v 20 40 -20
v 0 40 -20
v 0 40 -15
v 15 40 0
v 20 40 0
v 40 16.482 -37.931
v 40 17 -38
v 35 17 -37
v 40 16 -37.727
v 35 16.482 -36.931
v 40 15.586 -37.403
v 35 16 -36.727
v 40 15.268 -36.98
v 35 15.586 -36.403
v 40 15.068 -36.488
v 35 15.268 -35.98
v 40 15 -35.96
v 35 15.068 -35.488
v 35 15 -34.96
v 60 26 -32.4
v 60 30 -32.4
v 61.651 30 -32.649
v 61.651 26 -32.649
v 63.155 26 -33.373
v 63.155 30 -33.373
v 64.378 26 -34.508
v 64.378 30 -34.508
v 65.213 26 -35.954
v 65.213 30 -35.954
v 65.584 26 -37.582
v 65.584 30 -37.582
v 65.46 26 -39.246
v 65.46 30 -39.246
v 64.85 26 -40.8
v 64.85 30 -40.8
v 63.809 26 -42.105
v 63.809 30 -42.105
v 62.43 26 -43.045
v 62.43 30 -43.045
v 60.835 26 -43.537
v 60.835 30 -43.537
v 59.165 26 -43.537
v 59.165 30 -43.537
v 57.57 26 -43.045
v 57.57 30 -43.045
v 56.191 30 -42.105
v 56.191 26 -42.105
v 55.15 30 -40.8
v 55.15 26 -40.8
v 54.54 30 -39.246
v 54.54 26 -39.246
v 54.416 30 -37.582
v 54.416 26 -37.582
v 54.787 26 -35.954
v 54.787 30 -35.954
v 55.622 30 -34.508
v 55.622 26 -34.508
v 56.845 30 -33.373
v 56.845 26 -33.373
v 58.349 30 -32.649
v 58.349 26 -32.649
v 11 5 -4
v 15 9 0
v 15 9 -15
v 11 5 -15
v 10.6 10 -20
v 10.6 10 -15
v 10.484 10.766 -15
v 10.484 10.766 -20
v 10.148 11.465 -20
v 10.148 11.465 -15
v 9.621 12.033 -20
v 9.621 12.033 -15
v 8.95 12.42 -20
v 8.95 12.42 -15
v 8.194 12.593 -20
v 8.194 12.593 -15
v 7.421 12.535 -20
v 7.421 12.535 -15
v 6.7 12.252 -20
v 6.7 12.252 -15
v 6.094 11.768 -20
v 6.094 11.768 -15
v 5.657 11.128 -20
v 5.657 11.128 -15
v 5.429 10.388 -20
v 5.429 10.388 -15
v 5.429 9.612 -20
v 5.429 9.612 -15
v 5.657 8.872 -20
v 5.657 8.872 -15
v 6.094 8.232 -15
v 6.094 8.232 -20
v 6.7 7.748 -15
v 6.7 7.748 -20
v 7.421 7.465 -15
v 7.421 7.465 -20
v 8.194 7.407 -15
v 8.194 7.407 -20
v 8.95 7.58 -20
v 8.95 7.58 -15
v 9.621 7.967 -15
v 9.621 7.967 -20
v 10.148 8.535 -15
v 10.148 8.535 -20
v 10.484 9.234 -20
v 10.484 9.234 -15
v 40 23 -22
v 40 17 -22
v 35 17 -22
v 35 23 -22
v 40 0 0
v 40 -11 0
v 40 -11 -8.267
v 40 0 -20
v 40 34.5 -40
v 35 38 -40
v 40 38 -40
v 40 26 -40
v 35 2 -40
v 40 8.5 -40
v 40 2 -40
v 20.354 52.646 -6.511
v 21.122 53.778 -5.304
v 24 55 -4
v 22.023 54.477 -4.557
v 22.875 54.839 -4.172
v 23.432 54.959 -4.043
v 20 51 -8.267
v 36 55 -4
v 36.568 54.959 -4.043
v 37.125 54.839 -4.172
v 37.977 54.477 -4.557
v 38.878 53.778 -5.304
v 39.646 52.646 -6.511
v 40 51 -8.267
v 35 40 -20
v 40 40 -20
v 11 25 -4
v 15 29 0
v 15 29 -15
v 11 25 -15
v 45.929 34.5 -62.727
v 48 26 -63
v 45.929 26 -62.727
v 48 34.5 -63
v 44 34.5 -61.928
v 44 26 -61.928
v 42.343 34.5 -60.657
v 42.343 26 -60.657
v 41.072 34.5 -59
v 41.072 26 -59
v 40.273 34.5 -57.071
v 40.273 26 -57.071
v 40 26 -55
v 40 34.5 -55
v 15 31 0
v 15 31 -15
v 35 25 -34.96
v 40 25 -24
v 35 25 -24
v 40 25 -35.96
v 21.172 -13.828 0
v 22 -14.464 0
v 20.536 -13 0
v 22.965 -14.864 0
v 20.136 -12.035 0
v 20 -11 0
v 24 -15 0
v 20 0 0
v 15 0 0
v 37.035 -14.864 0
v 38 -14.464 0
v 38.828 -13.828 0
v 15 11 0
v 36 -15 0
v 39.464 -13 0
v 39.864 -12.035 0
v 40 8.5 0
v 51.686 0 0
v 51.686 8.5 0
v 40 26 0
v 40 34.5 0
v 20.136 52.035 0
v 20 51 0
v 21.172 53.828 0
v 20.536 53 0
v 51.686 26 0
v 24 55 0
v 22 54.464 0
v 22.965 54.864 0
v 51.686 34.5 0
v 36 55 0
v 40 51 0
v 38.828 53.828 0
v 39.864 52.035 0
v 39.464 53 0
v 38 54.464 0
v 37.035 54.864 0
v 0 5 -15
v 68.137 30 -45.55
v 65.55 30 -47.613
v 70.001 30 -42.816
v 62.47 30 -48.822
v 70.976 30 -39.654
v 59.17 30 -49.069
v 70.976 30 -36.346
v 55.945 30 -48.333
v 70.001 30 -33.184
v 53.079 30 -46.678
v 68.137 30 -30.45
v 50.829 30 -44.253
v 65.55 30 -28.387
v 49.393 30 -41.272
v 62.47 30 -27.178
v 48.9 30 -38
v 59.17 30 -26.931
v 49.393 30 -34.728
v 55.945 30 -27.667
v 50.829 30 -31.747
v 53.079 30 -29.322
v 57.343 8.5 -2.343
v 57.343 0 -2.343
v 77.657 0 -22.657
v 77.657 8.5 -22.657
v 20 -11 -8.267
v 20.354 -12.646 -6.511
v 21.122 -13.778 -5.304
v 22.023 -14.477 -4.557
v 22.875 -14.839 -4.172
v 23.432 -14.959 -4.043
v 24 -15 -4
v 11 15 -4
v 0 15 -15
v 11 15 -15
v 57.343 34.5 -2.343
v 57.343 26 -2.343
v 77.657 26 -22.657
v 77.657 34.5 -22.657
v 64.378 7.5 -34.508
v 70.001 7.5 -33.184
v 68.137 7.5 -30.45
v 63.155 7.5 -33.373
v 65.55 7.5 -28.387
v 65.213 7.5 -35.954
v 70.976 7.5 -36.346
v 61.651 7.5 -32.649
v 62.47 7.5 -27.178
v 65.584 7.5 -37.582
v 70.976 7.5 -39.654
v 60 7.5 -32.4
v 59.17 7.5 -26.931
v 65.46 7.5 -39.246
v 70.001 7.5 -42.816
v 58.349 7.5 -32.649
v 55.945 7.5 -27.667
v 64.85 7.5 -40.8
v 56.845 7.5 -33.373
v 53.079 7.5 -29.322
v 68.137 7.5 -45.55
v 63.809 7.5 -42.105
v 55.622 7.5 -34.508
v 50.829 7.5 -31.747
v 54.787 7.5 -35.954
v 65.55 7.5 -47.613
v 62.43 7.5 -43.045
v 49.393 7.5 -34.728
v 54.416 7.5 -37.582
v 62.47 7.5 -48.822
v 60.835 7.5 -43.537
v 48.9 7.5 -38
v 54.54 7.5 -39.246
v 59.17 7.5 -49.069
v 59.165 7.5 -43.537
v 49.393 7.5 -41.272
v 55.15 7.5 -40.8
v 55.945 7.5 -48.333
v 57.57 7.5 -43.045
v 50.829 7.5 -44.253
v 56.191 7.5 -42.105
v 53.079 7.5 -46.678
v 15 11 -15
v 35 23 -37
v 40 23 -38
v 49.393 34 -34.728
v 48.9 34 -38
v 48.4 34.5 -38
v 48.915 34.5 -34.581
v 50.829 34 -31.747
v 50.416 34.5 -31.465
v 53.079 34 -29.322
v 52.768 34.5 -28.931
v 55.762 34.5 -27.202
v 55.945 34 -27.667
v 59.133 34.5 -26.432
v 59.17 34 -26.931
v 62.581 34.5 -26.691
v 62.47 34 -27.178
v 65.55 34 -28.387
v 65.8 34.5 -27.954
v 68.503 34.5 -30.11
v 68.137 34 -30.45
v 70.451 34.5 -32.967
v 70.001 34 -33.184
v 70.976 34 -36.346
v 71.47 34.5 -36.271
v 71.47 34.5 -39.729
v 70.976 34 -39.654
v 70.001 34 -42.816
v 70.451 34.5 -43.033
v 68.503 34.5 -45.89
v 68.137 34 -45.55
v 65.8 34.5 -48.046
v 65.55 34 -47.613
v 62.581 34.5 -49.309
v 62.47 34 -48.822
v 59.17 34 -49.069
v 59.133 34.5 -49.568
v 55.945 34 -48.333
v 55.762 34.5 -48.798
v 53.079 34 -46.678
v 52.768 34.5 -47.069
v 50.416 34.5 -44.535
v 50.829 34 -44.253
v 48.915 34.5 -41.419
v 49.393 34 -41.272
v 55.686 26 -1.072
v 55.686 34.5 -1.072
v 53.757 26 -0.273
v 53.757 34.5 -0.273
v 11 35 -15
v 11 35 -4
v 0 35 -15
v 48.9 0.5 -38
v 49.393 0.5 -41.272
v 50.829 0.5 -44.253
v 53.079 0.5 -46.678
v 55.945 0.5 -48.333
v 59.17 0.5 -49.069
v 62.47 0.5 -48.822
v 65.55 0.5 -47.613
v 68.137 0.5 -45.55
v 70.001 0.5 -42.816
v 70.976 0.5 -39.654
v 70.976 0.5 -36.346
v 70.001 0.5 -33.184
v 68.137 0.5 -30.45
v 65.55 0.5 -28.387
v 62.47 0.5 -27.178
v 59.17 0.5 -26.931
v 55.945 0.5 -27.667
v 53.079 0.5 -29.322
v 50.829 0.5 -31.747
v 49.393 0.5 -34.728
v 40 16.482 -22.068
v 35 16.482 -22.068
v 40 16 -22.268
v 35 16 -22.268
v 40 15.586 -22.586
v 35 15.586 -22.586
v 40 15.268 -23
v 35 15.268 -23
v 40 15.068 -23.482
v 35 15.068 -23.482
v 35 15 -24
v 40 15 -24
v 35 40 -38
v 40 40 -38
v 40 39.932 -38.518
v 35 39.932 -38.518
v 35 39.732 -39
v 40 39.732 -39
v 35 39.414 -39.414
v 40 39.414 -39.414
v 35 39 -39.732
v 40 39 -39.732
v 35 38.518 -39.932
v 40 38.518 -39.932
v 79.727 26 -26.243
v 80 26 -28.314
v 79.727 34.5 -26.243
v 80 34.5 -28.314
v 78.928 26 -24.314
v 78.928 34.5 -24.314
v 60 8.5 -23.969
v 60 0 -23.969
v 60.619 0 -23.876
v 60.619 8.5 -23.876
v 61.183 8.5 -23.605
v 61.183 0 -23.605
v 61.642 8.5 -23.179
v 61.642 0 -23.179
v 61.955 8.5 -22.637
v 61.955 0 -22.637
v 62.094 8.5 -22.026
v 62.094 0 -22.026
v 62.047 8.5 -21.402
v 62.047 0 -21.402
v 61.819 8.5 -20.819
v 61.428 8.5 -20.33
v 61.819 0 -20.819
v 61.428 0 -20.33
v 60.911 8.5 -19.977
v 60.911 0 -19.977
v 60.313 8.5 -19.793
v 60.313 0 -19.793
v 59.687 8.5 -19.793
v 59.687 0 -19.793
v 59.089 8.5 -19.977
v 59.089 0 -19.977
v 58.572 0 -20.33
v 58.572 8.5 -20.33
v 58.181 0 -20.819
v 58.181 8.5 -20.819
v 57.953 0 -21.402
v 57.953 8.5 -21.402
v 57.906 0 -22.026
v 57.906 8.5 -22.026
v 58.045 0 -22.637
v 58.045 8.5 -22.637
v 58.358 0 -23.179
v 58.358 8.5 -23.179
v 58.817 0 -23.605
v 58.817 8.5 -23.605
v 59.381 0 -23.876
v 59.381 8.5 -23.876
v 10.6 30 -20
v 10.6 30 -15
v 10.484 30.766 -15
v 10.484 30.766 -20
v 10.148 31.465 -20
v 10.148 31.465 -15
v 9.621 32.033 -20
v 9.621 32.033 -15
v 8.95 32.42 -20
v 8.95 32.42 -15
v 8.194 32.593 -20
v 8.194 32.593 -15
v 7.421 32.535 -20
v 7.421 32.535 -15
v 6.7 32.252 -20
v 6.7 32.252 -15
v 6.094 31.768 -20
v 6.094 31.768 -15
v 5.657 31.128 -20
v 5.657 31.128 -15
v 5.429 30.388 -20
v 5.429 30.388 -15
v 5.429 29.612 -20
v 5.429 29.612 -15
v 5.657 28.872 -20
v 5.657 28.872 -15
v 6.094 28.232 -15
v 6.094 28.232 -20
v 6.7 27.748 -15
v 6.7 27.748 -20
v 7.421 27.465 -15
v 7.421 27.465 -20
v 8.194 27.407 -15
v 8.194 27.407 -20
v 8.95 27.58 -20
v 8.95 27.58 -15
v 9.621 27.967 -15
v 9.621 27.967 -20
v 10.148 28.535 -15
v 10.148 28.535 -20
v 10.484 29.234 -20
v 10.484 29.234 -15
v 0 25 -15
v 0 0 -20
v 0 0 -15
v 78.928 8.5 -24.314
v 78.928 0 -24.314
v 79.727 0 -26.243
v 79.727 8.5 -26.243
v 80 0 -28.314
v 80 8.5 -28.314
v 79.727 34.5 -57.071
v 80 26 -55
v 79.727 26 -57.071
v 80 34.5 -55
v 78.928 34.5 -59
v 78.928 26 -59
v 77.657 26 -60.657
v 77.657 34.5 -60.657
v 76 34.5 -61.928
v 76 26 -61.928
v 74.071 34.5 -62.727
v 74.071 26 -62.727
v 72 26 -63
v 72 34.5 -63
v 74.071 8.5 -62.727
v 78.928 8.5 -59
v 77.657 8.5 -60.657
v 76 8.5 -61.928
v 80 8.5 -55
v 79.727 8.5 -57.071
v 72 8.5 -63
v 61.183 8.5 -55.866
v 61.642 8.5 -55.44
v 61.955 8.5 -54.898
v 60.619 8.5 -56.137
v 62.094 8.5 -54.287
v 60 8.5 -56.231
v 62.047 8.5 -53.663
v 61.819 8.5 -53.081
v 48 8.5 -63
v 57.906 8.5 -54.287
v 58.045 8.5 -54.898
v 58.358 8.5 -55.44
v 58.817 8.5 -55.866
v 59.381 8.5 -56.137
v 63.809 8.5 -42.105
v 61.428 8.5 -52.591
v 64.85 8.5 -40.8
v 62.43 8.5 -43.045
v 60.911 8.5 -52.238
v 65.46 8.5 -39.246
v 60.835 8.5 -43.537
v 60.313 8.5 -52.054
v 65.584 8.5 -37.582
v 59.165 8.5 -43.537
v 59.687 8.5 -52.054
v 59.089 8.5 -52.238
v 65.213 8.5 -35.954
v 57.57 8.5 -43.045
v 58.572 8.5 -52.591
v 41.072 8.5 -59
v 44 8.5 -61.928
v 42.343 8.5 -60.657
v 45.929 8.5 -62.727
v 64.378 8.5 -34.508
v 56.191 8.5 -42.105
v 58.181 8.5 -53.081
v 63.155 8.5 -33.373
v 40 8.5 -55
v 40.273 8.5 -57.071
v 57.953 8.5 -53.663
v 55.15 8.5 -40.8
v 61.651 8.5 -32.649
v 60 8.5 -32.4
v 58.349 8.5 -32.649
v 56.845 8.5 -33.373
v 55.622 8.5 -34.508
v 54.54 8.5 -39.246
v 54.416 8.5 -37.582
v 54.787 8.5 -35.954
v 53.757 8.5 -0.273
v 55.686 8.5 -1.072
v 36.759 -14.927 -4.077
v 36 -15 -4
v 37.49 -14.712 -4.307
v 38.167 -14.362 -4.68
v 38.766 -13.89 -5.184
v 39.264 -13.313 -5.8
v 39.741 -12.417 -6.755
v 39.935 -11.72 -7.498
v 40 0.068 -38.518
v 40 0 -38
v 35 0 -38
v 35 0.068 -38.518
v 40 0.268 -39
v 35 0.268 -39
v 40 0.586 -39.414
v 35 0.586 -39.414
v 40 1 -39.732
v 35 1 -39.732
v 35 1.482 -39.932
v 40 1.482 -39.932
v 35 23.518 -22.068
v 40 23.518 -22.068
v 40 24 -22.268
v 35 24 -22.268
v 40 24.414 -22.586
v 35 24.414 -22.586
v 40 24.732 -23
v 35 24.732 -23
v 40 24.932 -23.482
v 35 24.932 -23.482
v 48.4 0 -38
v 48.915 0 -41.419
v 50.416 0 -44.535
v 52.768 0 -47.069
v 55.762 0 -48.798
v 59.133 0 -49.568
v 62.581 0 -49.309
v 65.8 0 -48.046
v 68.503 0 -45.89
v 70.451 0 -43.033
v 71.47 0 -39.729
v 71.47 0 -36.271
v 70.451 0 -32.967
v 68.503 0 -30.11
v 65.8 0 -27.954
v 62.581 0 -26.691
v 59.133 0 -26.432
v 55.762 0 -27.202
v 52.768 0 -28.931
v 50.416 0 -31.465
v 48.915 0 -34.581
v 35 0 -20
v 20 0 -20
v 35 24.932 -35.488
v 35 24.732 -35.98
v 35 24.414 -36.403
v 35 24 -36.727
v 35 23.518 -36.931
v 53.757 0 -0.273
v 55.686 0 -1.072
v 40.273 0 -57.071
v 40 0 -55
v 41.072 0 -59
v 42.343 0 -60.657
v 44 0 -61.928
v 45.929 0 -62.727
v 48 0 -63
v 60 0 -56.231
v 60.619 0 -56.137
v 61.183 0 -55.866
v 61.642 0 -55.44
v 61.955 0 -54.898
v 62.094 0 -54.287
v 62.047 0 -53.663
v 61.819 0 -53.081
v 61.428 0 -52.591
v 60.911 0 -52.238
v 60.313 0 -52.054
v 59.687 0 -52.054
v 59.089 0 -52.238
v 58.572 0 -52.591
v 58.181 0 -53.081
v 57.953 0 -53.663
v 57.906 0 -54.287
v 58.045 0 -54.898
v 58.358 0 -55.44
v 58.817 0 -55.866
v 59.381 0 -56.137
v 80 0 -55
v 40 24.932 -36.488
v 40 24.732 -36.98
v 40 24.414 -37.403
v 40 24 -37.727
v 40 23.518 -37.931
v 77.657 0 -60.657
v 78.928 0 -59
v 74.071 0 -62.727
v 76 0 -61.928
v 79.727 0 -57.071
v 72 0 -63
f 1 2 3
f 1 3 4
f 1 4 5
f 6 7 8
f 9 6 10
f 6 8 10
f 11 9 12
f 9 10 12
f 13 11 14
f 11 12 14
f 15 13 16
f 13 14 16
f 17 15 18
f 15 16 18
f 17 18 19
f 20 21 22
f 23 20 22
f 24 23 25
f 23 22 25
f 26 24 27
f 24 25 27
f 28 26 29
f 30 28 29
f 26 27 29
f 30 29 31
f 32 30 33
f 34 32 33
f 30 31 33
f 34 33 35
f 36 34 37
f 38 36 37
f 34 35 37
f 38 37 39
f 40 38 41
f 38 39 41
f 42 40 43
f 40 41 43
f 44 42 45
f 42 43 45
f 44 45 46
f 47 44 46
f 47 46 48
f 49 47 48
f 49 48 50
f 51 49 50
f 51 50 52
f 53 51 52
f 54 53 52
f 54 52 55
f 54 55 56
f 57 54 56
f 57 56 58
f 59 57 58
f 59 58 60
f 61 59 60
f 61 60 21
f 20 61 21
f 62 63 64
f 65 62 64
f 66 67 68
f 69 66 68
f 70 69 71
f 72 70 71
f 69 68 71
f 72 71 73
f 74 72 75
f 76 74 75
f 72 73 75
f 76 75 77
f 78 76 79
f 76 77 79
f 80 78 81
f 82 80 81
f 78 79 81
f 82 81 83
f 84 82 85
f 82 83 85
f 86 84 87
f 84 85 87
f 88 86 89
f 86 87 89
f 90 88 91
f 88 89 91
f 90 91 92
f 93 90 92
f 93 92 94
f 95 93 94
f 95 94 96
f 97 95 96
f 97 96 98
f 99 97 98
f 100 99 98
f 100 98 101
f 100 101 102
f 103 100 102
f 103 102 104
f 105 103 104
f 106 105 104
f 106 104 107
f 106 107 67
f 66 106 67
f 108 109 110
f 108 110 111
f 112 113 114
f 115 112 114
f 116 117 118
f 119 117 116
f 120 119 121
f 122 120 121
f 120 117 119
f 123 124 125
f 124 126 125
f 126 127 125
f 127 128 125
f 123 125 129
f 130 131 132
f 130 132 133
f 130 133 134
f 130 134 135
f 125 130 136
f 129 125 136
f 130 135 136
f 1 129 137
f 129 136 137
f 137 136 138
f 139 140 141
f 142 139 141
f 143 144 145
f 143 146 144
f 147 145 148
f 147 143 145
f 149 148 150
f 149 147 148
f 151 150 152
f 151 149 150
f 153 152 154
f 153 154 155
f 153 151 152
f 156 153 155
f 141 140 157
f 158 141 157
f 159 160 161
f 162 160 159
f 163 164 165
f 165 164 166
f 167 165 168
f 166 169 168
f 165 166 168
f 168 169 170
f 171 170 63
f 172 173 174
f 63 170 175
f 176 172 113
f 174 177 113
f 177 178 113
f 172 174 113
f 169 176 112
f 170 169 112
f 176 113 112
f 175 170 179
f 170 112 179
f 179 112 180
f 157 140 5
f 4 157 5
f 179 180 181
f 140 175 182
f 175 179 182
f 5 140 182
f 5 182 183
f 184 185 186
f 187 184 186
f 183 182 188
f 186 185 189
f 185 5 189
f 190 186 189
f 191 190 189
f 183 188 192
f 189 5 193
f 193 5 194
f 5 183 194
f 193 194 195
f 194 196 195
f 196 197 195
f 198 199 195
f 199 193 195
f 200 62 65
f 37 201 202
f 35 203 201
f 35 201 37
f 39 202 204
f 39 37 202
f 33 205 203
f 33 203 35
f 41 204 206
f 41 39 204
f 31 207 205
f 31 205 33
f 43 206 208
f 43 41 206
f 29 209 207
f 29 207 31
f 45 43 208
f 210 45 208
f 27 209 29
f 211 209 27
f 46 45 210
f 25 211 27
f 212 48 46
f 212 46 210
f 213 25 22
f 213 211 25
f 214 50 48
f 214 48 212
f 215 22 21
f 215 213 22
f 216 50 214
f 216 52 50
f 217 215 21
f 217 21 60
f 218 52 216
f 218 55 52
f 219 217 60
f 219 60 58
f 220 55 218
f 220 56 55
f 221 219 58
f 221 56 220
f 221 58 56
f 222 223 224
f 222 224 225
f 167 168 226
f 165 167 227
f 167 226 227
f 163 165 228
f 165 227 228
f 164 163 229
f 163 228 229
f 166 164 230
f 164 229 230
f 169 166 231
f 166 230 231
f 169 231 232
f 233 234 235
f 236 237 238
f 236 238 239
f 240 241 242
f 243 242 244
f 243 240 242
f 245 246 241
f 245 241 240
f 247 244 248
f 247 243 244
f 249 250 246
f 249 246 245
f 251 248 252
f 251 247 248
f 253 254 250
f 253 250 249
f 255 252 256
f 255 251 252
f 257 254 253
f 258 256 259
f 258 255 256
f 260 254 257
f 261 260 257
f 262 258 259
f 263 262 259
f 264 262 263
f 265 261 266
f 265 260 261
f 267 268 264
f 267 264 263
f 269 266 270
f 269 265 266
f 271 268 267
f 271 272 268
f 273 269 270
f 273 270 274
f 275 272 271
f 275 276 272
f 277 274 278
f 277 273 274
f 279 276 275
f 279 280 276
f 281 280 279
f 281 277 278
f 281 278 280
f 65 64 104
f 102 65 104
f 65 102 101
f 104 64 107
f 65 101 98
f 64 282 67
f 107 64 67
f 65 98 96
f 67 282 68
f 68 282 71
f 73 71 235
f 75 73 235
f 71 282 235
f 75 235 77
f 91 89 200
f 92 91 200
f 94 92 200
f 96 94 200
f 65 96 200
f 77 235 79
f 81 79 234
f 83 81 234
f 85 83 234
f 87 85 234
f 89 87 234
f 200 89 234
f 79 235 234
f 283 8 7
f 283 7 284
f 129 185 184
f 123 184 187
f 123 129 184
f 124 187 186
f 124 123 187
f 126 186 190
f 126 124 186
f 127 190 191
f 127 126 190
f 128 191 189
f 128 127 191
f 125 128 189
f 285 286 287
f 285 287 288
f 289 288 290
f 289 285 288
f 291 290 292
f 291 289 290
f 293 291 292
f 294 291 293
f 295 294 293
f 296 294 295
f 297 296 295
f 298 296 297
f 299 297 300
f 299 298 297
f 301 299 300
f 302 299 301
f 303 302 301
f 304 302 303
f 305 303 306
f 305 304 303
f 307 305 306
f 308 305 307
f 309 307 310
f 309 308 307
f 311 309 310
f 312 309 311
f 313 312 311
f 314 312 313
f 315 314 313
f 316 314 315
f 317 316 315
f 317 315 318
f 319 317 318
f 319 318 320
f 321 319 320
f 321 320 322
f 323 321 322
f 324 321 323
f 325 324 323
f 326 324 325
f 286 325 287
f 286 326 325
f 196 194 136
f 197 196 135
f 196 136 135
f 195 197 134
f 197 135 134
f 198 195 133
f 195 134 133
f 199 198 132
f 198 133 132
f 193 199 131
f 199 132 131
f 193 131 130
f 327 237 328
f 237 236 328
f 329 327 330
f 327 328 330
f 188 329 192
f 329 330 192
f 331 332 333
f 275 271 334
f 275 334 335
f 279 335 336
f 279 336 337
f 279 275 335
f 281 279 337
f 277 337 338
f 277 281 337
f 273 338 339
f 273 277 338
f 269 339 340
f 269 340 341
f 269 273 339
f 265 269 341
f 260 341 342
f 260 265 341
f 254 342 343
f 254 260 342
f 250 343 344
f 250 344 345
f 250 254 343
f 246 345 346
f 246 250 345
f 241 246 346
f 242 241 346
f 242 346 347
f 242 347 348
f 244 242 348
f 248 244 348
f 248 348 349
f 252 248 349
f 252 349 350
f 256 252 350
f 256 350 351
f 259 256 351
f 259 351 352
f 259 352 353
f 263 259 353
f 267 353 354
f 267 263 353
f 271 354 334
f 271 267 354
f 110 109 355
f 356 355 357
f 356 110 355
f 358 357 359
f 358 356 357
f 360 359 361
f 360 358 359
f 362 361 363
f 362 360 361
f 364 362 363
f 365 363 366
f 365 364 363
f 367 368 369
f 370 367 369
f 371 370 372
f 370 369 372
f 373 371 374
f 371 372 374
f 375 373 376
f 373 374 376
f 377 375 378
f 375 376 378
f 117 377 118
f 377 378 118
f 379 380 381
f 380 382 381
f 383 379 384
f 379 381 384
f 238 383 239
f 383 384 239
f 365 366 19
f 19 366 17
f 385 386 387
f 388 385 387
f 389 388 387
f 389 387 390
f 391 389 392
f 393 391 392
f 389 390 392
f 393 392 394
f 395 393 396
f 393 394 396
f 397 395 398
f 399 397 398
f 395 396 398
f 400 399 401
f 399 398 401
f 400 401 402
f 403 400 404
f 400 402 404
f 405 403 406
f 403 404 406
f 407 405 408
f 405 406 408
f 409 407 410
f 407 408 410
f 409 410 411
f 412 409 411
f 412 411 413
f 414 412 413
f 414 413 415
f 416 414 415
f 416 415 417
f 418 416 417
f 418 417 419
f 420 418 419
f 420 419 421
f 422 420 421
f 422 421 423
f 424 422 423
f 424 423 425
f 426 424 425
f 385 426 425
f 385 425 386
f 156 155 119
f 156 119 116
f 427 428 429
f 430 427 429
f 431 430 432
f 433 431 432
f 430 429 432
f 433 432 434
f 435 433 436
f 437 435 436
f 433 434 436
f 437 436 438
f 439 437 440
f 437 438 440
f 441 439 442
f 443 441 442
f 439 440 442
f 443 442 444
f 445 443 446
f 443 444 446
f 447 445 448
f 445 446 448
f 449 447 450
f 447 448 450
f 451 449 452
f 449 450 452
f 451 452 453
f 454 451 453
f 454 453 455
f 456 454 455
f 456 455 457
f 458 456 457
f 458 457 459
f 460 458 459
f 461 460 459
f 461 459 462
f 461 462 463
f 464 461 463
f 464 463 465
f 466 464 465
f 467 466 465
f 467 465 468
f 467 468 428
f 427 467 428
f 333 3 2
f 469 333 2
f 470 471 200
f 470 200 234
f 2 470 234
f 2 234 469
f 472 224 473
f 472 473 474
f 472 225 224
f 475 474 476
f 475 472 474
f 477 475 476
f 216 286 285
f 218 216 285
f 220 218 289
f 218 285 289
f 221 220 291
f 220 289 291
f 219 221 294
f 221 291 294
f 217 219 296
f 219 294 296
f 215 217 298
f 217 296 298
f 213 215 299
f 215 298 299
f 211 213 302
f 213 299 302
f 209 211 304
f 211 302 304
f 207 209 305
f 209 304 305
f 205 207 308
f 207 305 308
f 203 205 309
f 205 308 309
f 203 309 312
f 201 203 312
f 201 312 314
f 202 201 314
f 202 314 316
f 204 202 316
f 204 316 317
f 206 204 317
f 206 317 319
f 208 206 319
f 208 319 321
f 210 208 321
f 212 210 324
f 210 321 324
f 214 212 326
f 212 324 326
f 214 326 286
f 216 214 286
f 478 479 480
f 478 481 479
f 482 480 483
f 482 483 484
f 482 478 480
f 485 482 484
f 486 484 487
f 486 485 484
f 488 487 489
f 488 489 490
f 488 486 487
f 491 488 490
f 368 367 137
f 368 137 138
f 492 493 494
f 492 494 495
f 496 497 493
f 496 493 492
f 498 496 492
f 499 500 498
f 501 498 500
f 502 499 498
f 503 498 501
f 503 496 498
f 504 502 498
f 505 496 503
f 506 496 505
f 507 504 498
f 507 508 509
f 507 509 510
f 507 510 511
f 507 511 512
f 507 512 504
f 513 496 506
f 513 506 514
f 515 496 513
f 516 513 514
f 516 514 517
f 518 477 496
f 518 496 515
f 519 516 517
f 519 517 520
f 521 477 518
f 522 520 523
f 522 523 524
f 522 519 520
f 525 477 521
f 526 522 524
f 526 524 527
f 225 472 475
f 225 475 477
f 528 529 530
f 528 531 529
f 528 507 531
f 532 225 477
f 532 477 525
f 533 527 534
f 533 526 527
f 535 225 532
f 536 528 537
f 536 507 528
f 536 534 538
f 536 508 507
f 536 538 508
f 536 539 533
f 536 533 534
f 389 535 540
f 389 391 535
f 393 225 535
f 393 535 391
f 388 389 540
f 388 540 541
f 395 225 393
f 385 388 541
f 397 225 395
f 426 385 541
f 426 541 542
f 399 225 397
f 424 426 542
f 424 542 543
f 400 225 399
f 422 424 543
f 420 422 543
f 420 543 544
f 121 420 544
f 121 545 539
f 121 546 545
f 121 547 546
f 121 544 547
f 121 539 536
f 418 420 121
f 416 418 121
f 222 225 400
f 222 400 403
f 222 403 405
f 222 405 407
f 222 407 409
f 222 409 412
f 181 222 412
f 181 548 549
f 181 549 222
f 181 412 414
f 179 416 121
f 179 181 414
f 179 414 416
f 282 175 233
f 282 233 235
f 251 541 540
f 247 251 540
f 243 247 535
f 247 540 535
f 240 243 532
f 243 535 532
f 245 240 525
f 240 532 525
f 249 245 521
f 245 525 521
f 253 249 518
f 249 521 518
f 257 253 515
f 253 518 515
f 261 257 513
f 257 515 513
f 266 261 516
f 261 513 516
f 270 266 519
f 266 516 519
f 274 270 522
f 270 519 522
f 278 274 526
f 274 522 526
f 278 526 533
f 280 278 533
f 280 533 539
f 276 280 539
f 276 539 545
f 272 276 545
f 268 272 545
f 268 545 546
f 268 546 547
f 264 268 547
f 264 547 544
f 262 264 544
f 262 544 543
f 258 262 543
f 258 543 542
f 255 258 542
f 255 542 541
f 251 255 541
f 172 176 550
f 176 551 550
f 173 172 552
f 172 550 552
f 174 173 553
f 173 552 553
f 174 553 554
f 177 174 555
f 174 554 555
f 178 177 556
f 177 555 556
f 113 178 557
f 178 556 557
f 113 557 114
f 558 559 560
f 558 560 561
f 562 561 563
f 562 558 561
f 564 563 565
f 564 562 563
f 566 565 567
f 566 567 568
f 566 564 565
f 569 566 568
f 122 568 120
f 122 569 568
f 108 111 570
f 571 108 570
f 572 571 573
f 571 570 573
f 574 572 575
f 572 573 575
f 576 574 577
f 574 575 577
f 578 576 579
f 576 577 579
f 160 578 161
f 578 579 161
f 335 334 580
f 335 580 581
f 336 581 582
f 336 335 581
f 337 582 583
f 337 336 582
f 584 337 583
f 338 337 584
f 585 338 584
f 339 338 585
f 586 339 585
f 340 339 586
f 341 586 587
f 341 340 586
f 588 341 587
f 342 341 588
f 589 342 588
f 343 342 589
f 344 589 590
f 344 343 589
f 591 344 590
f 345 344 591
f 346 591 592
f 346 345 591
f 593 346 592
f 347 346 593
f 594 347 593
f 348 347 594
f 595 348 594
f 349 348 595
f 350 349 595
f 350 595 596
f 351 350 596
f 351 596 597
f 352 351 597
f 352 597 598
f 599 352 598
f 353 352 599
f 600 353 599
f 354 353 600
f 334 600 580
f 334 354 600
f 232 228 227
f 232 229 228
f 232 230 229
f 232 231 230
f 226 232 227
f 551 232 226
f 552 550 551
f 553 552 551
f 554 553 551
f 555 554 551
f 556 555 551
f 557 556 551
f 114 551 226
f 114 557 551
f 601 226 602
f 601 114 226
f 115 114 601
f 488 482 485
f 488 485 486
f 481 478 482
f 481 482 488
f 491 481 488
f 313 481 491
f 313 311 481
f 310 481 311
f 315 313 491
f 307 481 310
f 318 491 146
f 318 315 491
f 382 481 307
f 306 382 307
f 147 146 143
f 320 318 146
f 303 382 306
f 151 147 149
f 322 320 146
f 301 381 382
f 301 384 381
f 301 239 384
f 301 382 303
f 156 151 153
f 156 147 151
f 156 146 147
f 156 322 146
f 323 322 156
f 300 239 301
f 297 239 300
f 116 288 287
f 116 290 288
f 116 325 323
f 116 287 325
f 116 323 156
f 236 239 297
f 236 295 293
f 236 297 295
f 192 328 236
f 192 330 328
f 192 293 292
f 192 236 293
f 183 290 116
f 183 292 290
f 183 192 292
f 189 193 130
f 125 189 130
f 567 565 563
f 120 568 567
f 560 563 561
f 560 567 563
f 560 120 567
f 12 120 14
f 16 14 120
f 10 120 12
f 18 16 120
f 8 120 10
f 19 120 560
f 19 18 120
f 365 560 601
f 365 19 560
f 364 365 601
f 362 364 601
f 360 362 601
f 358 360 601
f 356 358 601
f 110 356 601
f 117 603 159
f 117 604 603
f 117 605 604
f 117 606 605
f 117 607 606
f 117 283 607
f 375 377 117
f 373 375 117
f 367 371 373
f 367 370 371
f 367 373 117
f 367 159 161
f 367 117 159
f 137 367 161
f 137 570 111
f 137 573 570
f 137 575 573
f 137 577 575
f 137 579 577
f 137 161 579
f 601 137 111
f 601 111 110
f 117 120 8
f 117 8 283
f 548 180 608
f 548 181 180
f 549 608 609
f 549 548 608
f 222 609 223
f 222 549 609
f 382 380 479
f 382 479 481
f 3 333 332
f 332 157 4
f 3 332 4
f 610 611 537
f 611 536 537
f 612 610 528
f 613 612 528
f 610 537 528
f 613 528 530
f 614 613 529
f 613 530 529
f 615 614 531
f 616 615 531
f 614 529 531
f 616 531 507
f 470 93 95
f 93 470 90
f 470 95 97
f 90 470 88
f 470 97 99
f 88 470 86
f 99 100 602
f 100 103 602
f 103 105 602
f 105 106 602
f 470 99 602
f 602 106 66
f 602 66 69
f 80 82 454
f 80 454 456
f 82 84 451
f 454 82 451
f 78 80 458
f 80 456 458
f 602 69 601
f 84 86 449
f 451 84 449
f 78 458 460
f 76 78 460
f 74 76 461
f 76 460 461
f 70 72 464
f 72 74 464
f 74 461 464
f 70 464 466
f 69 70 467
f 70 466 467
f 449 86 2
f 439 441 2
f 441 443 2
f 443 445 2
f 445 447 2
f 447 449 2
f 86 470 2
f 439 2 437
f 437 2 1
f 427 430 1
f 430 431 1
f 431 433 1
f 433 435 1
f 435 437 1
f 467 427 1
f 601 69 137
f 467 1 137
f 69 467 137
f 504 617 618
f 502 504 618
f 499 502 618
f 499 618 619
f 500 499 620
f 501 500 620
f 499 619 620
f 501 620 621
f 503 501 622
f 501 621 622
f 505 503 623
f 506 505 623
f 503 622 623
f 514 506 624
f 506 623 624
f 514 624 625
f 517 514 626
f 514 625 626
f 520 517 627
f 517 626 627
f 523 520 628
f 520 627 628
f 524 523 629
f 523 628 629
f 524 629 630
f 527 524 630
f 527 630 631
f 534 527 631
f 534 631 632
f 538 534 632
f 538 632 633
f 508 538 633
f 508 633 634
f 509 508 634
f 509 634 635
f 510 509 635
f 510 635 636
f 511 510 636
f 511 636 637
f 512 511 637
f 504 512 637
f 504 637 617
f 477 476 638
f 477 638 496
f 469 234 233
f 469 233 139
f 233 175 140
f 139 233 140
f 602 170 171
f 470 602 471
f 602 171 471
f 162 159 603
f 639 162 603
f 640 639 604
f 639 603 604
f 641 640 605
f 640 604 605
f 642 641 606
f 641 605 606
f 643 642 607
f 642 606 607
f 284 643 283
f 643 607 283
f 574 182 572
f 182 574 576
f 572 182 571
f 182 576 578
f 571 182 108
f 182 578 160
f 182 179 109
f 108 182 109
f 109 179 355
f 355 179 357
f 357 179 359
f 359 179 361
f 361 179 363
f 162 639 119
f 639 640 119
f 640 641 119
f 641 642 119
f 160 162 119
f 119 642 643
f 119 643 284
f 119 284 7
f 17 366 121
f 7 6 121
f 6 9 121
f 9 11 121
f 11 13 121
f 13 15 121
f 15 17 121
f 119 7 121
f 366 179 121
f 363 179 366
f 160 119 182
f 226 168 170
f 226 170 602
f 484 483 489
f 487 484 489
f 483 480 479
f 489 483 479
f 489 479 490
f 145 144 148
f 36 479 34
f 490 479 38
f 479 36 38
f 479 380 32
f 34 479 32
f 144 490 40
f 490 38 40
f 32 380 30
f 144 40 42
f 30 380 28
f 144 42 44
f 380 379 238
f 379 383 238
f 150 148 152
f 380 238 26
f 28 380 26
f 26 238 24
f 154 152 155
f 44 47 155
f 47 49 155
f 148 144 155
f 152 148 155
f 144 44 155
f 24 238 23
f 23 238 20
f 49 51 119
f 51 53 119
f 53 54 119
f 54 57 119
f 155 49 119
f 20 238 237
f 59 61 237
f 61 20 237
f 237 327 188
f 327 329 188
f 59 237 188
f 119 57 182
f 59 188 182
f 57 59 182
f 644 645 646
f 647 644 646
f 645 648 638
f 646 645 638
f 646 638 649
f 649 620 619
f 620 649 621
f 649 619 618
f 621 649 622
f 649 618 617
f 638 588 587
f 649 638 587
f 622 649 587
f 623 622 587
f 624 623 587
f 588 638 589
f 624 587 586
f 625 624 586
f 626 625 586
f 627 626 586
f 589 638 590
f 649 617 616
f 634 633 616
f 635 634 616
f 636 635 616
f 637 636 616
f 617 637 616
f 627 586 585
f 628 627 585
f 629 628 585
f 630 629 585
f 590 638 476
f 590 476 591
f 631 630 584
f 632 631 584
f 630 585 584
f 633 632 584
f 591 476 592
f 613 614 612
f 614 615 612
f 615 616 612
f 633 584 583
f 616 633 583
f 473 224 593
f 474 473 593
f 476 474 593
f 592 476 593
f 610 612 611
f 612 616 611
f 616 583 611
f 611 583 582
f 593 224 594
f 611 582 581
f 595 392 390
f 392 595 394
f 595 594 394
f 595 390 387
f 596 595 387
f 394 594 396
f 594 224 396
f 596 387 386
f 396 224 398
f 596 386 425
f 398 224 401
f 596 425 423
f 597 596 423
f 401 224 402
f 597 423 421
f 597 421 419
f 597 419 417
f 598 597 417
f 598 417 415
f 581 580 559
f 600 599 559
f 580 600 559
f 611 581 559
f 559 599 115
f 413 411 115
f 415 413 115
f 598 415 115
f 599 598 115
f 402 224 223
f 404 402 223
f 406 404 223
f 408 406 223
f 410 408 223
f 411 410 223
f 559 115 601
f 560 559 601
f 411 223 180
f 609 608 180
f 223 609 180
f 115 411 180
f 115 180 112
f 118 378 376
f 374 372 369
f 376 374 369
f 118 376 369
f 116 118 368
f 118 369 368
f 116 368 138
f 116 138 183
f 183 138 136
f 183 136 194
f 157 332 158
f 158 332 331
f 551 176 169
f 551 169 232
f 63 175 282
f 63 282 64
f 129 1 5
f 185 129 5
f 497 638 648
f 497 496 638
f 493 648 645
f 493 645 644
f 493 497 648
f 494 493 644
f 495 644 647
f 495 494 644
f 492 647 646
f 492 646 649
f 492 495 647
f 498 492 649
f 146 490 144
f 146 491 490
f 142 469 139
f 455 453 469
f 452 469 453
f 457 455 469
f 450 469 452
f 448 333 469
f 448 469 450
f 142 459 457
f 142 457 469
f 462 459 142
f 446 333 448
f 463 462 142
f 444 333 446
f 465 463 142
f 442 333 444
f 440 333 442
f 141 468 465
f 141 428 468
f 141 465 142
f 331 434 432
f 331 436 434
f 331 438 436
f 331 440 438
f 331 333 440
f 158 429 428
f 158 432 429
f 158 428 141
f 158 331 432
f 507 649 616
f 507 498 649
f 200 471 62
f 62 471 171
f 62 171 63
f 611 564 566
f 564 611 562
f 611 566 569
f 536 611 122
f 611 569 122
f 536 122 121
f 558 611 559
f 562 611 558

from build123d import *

# Parameters (mm, degrees)
SKETCH1_W                = 40
SKETCH1_H                = 40
BOSS_EXTRUDE1_DEPTH      = 40
SKETCH2_W                = 25
SKETCH2_H                = 20
CUT_EXTRUDE1_DEPTH       = 40
CHAMFER1_SIZE            = 15
CUT_EXTRUDE2_DEPTH       = 15
CHAMFER2_SIZE            = 4
SKETCH4_R                = 2.6
CUT_EXTRUDE3_DEPTH       = 17
BOSS_EXTRUDE2_DEPTH      = 8
BOSS_EXTRUDE2_DEPTH_BACK = 40
SKETCH5_W                = 40
SKETCH5_H                = 8.5
SKETCH10_W               = 14
SKETCH10_H               = 10
CUT_EXTRUDE5_DEPTH       = 26
SKETCH8_R                = 5.6
CUT_EXTRUDE4_DEPTH       = 34
BOSS_EXTRUDE3_DEPTH      = 20
FILLET3_R                = 4
FILLET4_R                = 2
CHAMFER7_SIZE            = 25
CHAMFER8_SIZE            = 2
CHAMFER8_SIZE2           = 10
FILLET7_R                = 2
SKETCH14_W               = 40
SKETCH14_H               = 8.5
BOSS_EXTRUDE4_DEPTH      = 15
SKETCH16_W               = 40
SKETCH16_H               = 8.5
BOSS_EXTRUDE5_DEPTH      = 15
SKETCH12_R               = 11.1
CUT_EXTRUDE6_DEPTH       = 4.5
CUT_EXTRUDE7_START       = -7.5
SKETCH13_R               = 11.1
CUT_EXTRUDE7_DEPTH       = 7.5
SKETCH15_R               = 2.1
CUT_EXTRUDE8_DEPTH       = 10
CHAMFER10_SIZE           = 0.5
FILLET8_R                = 8
CUT_EXTRUDE9_DEPTH       = 10


with BuildPart() as part:
    # Sketch1 → Boss-Extrude1 (new body)
    with BuildSketch(Plane(origin=(0, 0, 0), x_dir=(1, 0, 0), z_dir=(0, 1, 0))):
        with Locations((20, 20)):
            Rectangle(SKETCH1_W, SKETCH1_H)
    extrude(amount=BOSS_EXTRUDE1_DEPTH)

    # Sketch2 → Cut-Extrude1 (cut)
    with BuildSketch(Plane(origin=(0, 40, 0), x_dir=(1, 0, 0), z_dir=(0, 1, 0))):
        with Locations((12.5, 30)):
            Rectangle(SKETCH2_W, SKETCH2_H)
    extrude(amount=-CUT_EXTRUDE1_DEPTH, mode=Mode.SUBTRACT)

    # Chamfer1
    chamfer1_edges = [part.edges().sort_by_distance(p)[0] for p in [
        (0, 20, 0),
    ]]
    chamfer(chamfer1_edges, length=CHAMFER1_SIZE)

    # Sketch3 → Cut-Extrude2 (cut)
    with BuildSketch(Plane.XY):
        Polygon((0, 10), (0, 15), (15, 15), (15, 5), (0, 5), align=None)
        Polygon((0, 30), (0, 25), (15, 25), (15, 35), (0, 35), align=None)
    extrude(amount=-CUT_EXTRUDE2_DEPTH, mode=Mode.SUBTRACT)

    # Chamfer2
    chamfer2_edges = [part.edges().sort_by_distance(p)[0] for p in [
        (15, 35, -7.5),
        (15, 25, -7.5),
        (15, 15, -7.5),
        (15, 5, -7.5),
    ]]
    chamfer(chamfer2_edges, length=CHAMFER2_SIZE)

    # Sketch4 → Cut-Extrude3 (cut)
    with BuildSketch(Plane.XY.offset(-15)):
        with Locations((8, 30)):
            Circle(SKETCH4_R)
        with Locations((8, 10)):
            Circle(SKETCH4_R)
    extrude(amount=-CUT_EXTRUDE3_DEPTH, mode=Mode.SUBTRACT)

    # Sketch5 → Boss-Extrude2 (add, two sides: drawn at the far end of the back side and taken through both)
    with BuildSketch(Plane(origin=(0, 0, -40), x_dir=(-1, 0, 0), z_dir=(0, 0, -1)).offset(-BOSS_EXTRUDE2_DEPTH_BACK)):
        with Locations((-60, 4.25)):
            Rectangle(SKETCH5_W, SKETCH5_H)
        with Locations((-60, 30.25)):
            Rectangle(SKETCH5_W, SKETCH5_H)
    extrude(amount=BOSS_EXTRUDE2_DEPTH + BOSS_EXTRUDE2_DEPTH_BACK)

    # Sketch10 → Cut-Extrude5 (cut)
    with BuildSketch(Plane(origin=(40, 0, 0), x_dir=(0, 0, -1), z_dir=(1, 0, 0))):
        with Locations((29, 20)):
            Rectangle(SKETCH10_W, SKETCH10_H)
    extrude(amount=-CUT_EXTRUDE5_DEPTH, mode=Mode.SUBTRACT)

    # Sketch8 → Cut-Extrude4 (cut)
    with BuildSketch(Plane(origin=(0, 32, 0), x_dir=(1, 0, 0), z_dir=(0, 1, 0))):
        with Locations(Location((60, 38, 0), (0, 0, 270))):
            Circle(SKETCH8_R)
    extrude(amount=-CUT_EXTRUDE4_DEPTH, mode=Mode.SUBTRACT)

    # Sketch9 → Boss-Extrude3 (add)
    with BuildSketch(Plane(origin=(40, 0, 0), x_dir=(0, 0, -1), z_dir=(1, 0, 0))):
        Polygon((0, 40), (0, 55), (4, 55), (20, 40), align=None)
        Polygon((0, 0), (0, -15), (4, -15), (20, 0), align=None)
    extrude(amount=-BOSS_EXTRUDE3_DEPTH)

    # Fillet3
    fillet3_edges = [part.edges().sort_by_distance(p)[0] for p in [
        (20, 55, -2),
        (40, 55, -2),
        (20, -15, -2),
        (40, -15, -2),
    ]]
    fillet(fillet3_edges, radius=FILLET3_R)

    # Fillet4
    fillet4_edges = [part.edges().sort_by_distance(p)[0] for p in [
        (32.5, 40, -40),
        (32.5, 0, -40),
    ]]
    fillet(fillet4_edges, radius=FILLET4_R)

    # Chamfer7
    chamfer7_edges = [part.edges().sort_by_distance(p)[0] for p in [
        (80, 4.25, 0),
        (80, 30.25, 0),
    ]]
    chamfer(chamfer7_edges, length=CHAMFER7_SIZE)

    # Chamfer8
    chamfer8_edges = [part.edges().sort_by_distance(p)[0] for p in [
        (40, 20, -36),
    ]]
    chamfer8_side = [part.faces().sort_by_distance(p)[0] for p in [
        (40, 16.5625, -17.75),
    ]]
    chamfer(chamfer8_edges, length=CHAMFER8_SIZE, length2=CHAMFER8_SIZE2, reference=chamfer8_side[0])

    # Fillet7
    fillet7_edges = [part.edges().sort_by_distance(p)[0] for p in [
        (27.5, 15, -36),
        (32.5, 15, -22),
        (32.5, 25, -22),
        (27.5, 25, -36),
        (35, 25, -37),
        (35, 15, -37),
    ]]
    fillet(fillet7_edges, radius=FILLET7_R)

    # Sketch14 → Boss-Extrude4 (add)
    with BuildSketch(Plane(origin=(0, 0, -48), x_dir=(-1, 0, 0), z_dir=(0, 0, -1))):
        with Locations((-60, 4.25)):
            Rectangle(SKETCH14_W, SKETCH14_H)
    extrude(amount=BOSS_EXTRUDE4_DEPTH)

    # Sketch16 → Boss-Extrude5 (add)
    with BuildSketch(Plane(origin=(0, 0, -48), x_dir=(-1, 0, 0), z_dir=(0, 0, -1))):
        with Locations((-60, 30.25)):
            Rectangle(SKETCH16_W, SKETCH16_H)
    extrude(amount=BOSS_EXTRUDE5_DEPTH)

    # Sketch12 → Cut-Extrude6 (cut)
    with BuildSketch(Plane(origin=(0, 34.5, 0), x_dir=(1, 0, 0), z_dir=(0, 1, 0))):
        with Locations(Location((60, 38, 0), (0, 0, 180))):
            Circle(SKETCH12_R)
    extrude(amount=-CUT_EXTRUDE6_DEPTH, mode=Mode.SUBTRACT)

    # Sketch13 → Cut-Extrude7 (cut)
    with BuildSketch(Plane.XZ.offset(CUT_EXTRUDE7_START)):
        with Locations(Location((60, -38, 0), (0, 0, 180))):
            Circle(SKETCH13_R)
    extrude(amount=CUT_EXTRUDE7_DEPTH, mode=Mode.SUBTRACT)

    # Sketch15 → Cut-Extrude8 (cut)
    with BuildSketch(Plane.XZ):
        with Locations(Location((60, -54.130501699, 0), (0, 0, 270))):
            Circle(SKETCH15_R)
        with Locations(Location((60, -21.869498301, 0), (0, 0, 270))):
            Circle(SKETCH15_R)
    extrude(amount=-CUT_EXTRUDE8_DEPTH, mode=Mode.SUBTRACT)

    # Chamfer10
    chamfer10_edges = [part.edges().sort_by_distance(p)[0] for p in [
        (71.1, 34.5, -38),
        (71.1, 0, -38),
    ]]
    chamfer(chamfer10_edges, length=CHAMFER10_SIZE)

    # Fillet8
    fillet8_edges = [part.edges().sort_by_distance(p)[0] for p in [
        (55, 30.25, 0),
        (55, 4.25, 0),
        (80, 4.25, -25),
        (80, 30.25, -25),
        (80, 4.25, -63),
        (40, 4.25, -63),
        (80, 30.25, -63),
        (40, 30.25, -63),
    ]]
    fillet(fillet8_edges, radius=FILLET8_R)

    # Sketch17 → Cut-Extrude9 (cut)
    with BuildSketch(Plane.ZY.offset(-25)):
        Polygon((-20, 0), (-20, 68.838193982), (-62.566783677, 68.838193982), (-62.566783677, -51.070720767), align=None)
    extrude(amount=-CUT_EXTRUDE9_DEPTH, mode=Mode.SUBTRACT)


solid = part.part
